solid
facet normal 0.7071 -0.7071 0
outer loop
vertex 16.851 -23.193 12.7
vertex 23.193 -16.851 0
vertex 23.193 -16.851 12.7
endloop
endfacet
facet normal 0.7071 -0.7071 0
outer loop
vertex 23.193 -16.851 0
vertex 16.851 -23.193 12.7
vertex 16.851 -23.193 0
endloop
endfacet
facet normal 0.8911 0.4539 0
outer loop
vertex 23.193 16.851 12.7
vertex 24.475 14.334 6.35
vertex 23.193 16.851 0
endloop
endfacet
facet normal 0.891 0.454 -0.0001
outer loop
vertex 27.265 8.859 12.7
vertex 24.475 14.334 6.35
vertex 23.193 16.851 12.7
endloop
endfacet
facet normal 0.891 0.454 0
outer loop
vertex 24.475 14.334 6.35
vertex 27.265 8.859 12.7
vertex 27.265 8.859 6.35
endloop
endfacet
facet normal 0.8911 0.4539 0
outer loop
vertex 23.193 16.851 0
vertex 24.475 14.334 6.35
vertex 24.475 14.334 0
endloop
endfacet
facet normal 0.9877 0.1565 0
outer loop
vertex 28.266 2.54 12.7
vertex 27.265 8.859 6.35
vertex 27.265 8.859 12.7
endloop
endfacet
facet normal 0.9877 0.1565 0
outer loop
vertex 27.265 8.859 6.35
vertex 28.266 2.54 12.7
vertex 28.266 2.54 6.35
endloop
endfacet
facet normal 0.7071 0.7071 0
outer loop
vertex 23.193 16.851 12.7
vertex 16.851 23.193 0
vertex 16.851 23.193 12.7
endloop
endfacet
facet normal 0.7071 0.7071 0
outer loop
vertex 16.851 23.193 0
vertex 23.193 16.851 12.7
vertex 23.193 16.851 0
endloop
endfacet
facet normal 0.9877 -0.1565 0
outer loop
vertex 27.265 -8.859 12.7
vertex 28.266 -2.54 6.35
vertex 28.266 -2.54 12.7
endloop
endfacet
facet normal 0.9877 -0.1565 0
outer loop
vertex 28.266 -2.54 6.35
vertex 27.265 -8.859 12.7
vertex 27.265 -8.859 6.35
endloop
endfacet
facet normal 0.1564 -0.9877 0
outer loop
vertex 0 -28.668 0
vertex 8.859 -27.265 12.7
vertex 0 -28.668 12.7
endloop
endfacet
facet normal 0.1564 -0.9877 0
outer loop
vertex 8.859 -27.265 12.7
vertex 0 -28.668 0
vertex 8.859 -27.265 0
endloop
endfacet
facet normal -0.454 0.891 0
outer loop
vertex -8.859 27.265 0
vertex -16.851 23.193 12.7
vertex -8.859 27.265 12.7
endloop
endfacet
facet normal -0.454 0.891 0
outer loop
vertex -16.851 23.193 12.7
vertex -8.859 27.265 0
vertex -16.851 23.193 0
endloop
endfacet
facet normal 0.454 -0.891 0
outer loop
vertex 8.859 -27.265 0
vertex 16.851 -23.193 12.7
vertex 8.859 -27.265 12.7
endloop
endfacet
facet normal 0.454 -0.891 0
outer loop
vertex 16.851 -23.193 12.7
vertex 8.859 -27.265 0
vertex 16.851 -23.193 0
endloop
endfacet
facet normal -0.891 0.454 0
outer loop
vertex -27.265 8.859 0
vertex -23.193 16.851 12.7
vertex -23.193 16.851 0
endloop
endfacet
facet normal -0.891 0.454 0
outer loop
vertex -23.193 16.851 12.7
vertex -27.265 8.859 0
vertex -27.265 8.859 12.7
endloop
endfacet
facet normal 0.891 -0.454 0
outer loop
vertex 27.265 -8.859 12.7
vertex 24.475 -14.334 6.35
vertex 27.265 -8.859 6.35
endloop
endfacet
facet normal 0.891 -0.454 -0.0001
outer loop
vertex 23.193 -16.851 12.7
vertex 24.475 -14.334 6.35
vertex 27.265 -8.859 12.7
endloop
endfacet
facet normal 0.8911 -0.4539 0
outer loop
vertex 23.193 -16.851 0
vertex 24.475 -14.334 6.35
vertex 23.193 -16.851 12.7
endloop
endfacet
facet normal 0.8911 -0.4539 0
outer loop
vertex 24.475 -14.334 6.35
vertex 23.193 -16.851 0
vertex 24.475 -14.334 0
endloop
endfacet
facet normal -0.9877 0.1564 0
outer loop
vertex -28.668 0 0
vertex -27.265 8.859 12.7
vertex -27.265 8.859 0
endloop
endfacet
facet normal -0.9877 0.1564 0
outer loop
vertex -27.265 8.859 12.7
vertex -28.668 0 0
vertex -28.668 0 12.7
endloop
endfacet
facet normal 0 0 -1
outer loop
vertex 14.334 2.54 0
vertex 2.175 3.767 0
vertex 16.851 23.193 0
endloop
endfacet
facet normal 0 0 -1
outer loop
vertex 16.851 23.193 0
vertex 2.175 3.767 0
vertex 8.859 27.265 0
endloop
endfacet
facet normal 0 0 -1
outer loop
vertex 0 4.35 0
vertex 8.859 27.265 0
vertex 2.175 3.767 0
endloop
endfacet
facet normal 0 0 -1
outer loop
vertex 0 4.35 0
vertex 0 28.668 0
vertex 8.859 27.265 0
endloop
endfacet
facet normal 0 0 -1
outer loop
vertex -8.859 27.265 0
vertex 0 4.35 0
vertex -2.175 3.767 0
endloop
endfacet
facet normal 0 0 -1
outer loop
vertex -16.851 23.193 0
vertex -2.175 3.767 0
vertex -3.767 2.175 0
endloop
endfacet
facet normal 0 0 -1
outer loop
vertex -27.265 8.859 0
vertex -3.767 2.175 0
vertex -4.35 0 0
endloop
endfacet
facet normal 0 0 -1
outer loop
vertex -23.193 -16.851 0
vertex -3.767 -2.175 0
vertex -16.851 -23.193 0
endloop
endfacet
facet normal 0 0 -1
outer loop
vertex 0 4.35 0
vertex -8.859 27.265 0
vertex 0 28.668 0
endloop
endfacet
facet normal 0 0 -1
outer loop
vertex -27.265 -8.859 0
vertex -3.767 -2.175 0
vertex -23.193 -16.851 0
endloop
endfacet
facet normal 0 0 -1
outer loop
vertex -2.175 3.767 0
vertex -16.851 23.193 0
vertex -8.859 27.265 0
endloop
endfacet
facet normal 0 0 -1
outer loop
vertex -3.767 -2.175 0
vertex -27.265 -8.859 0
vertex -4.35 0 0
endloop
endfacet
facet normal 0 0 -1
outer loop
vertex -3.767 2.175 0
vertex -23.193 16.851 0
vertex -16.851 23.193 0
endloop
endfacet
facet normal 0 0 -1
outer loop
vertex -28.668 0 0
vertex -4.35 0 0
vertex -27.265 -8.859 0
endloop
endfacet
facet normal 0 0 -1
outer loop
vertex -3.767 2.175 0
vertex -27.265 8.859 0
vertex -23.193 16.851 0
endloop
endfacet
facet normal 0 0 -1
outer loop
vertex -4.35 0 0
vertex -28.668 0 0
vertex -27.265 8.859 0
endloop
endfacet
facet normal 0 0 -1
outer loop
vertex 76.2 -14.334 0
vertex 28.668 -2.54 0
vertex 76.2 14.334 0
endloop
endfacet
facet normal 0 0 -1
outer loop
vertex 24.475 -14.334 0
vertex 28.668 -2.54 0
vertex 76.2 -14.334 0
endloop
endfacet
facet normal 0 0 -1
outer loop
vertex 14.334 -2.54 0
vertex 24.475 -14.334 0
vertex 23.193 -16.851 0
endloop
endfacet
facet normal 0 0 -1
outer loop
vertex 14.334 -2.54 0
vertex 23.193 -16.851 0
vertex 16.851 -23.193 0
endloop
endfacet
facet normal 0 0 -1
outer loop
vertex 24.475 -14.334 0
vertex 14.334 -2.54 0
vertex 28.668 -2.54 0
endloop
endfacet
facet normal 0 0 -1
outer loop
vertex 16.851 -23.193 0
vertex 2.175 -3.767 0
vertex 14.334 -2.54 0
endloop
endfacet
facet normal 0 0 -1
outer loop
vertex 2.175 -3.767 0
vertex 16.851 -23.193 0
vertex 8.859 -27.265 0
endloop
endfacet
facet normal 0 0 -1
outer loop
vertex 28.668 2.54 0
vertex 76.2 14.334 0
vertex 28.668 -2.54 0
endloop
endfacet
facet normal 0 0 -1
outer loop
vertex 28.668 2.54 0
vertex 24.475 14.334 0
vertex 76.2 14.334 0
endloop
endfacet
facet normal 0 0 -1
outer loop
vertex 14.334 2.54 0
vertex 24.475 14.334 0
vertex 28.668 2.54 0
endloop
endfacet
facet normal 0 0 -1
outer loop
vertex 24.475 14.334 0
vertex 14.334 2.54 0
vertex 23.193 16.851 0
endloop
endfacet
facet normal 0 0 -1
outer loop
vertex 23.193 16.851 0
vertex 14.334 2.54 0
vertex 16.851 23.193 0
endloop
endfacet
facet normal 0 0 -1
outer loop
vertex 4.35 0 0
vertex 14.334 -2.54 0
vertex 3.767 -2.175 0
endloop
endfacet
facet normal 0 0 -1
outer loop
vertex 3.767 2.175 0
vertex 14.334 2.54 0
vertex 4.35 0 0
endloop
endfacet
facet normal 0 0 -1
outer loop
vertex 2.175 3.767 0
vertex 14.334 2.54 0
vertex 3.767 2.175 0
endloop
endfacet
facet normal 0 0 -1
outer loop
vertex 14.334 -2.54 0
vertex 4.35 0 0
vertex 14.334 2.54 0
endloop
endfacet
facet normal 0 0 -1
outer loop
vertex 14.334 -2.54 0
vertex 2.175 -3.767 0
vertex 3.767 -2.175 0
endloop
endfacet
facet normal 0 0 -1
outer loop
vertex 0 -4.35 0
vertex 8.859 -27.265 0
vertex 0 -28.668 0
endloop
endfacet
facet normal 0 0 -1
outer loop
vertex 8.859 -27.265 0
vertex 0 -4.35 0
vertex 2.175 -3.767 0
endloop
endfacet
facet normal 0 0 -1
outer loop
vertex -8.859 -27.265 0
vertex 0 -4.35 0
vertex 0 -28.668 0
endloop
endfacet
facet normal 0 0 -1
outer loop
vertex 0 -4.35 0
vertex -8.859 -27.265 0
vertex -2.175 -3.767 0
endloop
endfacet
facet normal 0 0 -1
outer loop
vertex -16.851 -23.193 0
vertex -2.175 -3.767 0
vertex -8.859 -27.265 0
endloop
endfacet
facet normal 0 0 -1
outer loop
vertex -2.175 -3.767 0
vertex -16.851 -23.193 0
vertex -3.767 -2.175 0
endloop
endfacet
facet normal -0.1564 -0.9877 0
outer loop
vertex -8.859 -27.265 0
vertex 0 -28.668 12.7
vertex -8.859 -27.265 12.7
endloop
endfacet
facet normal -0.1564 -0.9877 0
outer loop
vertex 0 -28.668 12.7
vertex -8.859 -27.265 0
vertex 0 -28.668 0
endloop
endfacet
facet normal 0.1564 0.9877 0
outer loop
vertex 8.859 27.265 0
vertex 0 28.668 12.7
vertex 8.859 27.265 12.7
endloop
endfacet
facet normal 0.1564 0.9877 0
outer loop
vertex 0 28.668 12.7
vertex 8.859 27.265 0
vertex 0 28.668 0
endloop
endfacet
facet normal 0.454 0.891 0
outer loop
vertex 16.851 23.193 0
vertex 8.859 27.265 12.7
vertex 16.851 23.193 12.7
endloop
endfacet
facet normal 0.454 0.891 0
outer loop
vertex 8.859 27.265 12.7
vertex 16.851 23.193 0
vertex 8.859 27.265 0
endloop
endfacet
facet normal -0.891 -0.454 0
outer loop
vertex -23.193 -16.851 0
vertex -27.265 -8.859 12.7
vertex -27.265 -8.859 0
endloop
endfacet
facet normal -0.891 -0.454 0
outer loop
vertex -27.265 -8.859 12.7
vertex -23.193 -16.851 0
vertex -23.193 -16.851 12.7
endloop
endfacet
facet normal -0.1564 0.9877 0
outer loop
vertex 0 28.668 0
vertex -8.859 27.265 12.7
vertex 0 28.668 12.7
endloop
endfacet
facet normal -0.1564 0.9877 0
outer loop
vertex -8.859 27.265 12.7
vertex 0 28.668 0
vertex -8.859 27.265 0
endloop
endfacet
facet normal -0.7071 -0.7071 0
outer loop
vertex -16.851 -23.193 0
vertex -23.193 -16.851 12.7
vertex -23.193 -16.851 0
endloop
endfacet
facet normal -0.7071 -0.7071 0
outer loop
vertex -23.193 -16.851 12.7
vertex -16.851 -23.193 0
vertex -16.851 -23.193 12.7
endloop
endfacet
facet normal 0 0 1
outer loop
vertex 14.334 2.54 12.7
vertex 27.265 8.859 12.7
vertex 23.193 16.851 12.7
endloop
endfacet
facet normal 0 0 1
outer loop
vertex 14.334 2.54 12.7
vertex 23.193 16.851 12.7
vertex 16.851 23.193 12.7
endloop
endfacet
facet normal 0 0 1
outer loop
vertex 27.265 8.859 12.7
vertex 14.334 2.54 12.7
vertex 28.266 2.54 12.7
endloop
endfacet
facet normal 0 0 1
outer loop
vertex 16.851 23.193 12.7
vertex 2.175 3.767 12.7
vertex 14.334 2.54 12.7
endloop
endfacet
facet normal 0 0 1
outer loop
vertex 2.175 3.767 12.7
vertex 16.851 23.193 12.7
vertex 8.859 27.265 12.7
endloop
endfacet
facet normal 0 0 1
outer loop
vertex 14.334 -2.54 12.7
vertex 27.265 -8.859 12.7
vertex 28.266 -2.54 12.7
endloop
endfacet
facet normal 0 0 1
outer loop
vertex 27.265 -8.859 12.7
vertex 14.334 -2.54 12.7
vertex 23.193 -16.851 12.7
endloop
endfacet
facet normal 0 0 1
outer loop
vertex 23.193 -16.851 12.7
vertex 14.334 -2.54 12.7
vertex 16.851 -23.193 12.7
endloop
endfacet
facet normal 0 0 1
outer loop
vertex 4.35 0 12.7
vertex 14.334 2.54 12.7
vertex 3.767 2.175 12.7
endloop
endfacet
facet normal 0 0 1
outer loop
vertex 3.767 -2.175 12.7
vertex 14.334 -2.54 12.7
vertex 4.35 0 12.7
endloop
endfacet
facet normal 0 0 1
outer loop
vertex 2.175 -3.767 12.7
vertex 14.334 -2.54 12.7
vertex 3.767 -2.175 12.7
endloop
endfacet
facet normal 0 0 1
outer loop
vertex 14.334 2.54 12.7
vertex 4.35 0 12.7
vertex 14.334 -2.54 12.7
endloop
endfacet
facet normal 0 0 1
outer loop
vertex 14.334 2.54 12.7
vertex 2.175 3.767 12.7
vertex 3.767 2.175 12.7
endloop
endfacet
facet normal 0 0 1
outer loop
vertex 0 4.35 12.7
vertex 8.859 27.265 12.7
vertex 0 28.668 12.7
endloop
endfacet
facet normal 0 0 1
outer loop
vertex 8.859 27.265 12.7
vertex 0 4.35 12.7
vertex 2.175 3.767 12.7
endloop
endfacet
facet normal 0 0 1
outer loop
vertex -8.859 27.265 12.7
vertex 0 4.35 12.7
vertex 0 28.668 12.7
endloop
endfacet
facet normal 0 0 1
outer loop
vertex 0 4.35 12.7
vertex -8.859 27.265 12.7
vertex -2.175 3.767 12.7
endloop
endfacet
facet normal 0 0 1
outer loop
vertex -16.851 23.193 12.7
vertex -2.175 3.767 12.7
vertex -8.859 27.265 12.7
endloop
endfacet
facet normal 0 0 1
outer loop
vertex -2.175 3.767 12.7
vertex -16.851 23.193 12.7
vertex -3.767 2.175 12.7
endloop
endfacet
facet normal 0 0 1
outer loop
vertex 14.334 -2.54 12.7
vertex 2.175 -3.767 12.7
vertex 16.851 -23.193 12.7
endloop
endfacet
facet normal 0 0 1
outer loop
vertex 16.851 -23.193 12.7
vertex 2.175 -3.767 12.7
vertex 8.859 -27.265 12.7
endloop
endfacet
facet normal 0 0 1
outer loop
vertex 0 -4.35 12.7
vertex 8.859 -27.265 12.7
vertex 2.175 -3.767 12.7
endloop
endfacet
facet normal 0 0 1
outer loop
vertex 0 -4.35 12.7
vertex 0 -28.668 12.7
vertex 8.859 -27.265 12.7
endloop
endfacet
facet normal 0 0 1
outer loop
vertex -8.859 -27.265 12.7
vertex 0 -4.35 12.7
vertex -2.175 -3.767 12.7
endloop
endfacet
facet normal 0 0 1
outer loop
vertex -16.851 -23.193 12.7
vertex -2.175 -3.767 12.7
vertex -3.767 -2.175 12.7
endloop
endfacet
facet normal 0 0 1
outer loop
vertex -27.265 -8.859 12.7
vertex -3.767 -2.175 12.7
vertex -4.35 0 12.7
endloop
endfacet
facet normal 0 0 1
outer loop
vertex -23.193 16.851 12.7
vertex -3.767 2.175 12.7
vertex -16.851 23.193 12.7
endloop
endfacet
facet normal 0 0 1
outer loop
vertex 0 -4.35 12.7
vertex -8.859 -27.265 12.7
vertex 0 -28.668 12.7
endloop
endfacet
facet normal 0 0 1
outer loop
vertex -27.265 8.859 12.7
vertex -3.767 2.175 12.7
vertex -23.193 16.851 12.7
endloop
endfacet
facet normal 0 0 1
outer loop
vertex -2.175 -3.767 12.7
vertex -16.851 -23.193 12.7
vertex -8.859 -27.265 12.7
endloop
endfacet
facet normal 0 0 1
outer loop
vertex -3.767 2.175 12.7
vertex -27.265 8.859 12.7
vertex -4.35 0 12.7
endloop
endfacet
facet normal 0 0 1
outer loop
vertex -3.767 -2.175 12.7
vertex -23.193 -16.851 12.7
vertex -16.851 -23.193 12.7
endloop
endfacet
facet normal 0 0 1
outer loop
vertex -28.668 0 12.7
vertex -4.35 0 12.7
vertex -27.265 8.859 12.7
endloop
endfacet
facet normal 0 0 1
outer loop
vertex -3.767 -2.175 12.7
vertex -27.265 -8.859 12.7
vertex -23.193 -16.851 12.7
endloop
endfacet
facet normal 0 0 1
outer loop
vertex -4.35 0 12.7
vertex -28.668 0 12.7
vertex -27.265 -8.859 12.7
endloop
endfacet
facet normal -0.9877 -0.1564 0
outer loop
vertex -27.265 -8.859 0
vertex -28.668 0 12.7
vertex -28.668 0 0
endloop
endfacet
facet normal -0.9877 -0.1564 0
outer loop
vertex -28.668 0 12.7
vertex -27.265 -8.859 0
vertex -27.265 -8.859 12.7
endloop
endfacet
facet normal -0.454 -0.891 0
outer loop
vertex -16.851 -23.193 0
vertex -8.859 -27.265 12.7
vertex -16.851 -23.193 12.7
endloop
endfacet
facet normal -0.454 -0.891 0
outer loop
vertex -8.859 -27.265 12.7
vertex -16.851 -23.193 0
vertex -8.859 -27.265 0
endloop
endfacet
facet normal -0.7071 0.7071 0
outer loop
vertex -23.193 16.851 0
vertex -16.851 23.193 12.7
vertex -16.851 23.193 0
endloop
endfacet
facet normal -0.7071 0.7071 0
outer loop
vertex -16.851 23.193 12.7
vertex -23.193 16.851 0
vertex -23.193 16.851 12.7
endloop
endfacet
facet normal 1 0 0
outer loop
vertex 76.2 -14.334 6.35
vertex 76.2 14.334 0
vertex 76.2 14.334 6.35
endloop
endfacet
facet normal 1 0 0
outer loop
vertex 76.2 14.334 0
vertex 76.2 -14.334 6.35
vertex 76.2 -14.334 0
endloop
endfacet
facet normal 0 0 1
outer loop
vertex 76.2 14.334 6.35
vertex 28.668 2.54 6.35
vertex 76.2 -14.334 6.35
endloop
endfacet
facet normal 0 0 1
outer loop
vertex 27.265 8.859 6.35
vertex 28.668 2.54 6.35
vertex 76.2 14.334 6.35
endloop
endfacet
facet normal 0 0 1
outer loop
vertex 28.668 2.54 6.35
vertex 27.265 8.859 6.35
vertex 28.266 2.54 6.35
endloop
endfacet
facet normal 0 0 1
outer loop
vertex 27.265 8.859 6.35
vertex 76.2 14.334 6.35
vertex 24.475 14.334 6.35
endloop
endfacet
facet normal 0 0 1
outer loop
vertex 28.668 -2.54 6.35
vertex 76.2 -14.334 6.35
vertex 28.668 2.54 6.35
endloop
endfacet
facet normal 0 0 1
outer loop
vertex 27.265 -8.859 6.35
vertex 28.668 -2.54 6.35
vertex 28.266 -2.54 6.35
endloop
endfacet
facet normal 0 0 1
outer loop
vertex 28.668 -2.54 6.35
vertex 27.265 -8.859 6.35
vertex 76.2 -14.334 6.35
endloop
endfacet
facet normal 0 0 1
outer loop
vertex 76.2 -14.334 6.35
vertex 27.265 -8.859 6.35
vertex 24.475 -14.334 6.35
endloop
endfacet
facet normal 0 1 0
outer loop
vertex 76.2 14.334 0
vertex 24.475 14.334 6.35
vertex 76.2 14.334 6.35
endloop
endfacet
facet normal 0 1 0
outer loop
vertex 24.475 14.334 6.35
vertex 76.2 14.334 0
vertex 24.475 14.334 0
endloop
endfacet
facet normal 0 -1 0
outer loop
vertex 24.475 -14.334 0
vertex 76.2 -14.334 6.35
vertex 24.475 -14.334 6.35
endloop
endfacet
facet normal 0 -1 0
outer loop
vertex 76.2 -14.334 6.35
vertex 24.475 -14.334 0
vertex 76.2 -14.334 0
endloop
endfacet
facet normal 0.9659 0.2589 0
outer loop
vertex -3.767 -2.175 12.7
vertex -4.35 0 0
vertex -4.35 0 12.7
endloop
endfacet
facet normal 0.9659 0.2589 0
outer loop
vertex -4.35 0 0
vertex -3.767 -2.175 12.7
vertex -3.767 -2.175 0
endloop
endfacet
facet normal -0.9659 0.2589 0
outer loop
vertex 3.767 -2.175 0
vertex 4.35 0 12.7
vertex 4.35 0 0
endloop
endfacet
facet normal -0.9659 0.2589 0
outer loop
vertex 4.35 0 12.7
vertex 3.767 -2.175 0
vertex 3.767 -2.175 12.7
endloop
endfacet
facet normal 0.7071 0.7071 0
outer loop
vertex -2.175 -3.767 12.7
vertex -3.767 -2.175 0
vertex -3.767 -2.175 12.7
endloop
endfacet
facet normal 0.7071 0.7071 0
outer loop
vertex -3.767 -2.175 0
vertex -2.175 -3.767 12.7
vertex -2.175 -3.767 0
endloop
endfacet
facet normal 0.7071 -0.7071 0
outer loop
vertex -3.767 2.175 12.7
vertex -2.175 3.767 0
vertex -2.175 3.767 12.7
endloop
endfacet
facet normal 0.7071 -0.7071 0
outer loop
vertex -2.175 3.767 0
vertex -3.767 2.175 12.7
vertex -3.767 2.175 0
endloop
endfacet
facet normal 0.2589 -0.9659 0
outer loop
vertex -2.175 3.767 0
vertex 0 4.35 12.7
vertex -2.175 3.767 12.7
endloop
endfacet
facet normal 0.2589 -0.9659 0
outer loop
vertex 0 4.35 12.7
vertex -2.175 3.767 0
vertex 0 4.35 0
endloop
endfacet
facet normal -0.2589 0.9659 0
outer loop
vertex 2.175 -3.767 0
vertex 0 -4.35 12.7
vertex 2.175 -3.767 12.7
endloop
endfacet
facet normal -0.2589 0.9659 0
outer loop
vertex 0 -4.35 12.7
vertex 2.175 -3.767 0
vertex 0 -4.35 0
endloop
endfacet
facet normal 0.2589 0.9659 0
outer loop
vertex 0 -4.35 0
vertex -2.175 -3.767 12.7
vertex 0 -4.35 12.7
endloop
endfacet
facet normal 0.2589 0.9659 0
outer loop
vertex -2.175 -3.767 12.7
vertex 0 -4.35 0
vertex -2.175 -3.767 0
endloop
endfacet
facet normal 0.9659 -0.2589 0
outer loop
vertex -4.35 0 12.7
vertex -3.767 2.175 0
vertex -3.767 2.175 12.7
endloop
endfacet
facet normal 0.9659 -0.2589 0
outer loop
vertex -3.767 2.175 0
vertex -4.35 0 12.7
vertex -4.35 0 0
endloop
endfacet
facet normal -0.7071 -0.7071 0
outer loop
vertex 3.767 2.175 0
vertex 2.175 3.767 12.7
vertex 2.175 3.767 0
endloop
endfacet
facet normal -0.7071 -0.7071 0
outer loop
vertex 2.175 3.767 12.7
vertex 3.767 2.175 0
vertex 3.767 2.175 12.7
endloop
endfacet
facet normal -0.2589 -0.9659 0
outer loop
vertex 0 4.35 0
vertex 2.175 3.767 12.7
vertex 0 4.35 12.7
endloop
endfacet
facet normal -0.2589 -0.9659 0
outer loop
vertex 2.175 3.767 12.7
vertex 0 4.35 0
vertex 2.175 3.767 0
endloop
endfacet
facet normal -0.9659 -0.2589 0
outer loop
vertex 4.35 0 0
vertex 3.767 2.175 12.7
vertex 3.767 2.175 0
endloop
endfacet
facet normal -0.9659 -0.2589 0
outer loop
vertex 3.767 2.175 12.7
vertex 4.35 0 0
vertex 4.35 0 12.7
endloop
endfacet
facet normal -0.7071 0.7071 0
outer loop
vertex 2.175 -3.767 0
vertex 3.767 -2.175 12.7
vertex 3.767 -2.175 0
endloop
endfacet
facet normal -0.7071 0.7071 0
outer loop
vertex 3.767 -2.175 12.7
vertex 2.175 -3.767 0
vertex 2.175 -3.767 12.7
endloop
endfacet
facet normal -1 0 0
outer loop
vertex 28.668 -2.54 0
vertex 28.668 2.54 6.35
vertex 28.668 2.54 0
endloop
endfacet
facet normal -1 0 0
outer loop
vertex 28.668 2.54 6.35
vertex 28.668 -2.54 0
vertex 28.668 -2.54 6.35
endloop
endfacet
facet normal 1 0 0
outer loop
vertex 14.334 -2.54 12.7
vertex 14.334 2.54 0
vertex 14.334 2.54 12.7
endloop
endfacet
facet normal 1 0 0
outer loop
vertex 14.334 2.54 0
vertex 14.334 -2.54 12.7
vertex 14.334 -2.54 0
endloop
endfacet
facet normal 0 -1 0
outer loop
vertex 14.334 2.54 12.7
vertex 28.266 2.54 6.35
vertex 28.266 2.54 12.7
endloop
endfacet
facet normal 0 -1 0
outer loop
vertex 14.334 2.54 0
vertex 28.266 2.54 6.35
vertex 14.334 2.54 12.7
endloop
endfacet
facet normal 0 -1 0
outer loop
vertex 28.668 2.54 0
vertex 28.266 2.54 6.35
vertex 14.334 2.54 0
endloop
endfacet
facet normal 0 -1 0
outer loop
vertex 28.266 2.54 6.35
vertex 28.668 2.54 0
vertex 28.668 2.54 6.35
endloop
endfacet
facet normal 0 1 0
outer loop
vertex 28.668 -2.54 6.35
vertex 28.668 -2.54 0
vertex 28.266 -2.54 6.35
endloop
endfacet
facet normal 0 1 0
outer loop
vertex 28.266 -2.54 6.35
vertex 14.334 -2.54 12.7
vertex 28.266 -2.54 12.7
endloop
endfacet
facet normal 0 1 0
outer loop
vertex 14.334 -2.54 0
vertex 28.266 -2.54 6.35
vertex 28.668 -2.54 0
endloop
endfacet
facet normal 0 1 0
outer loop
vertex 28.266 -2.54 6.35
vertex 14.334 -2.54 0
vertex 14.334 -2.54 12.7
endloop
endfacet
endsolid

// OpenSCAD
// file: ../Vitamins/Rod.scad
RodDiameter       = 1;
RodRadius         = 2;
RodClearanceSnug  = 3;
RodClearanceLoose = 4;
RodFn             = 5;

function RodClearanceSnug()  = RodClearanceSnug;
function RodClearanceLoose() = RodClearanceLoose;

RodBicNozzle = [
  [RodDiameter, 0.093],
  [RodRadius, 0.093/2],
  [RodClearanceSnug, 0.04],
  [RodClearanceLoose, 0.06],
  [RodFn, 5]
];
function Spec_RodBicNozzle() = RodBicNozzle;

RodBicFlint = [
  [RodDiameter, 0.0985],
  [RodRadius, 0.0985/2],
  [RodClearanceSnug, 0.04],
  [RodClearanceLoose, 0.06],
  [RodFn, 5]
];
function Spec_RodBicFlint() = RodBicFlint;

RodOneEighthInch = [
  [RodDiameter, 1/8],
  [RodRadius, 1/8/2],
  [RodClearanceSnug, 0.02],
  [RodClearanceLoose, 0.03],
  [RodFn, 8]
];
function Spec_RodOneEighthInch() = RodOneEighthInch;

RodOneQuarterInch = [
  [RodDiameter,       1/4],
  [RodRadius,         1/4/2],
  [RodClearanceSnug,  0.027],
  [RodClearanceLoose, 0.035],
  [RodFn,             8]
];
function Spec_RodOneQuarterInch() = RodOneQuarterInch;

RodFiveSixteenthInch = [
  [RodDiameter,       5/16],
  [RodRadius,         5/16/2],
  [RodClearanceSnug,  0.025],
  [RodClearanceLoose, 0.03],
  [RodFn,             12]
];
function Spec_RodFiveSixteenthInch() = RodFiveSixteenthInch;

RodThreeQuarterInchTubing = [
  [RodDiameter,       0.758],
  [RodRadius,         0.758/2],
  [RodClearanceSnug,  0.023],
  [RodClearanceLoose, 0.029],
  [RodFn,             30]
];
function Spec_RodThreeQuarterInchTubing() = RodThreeQuarterInchTubing;

/**
 * Lookup the diameter of a rod.
 * @param rod The rod to lookup.
 * @param clearance The RodClearance to use.
 */
function RodDiameter(rod=undef, clearance=undef)
           = lookup(RodDiameter, rod)
          + (clearance != undef ? lookup(clearance, rod) : 0);

/**
 * Lookup the radius of a rod.
 * @param rod The rod to lookup.
 * @param clearance The RodClearance to use.
 */
function RodRadius(rod, clearance=undef) = RodDiameter(rod, clearance)/2;

/**
 * Lookup the $fn value for a rod, optionally overriding it
 * @param rod The rod to lookup.
 * @param $fn Override the RodFn. If defined, this will be the result. (convenience arg)
 **/
function RodFn(rod, $fn=undef) = ($fn == undef) ? lookup(RodFn, rod) : $fn;

/**
 * A 2D rod (circle).
 * @param rod The rod to render.
 * @param clearance The RodClearance to use.
 * @param $fn Override the RodFn value of the rod.
 */
module Rod2d(rod=RodOneQuarterInch, clearance=undef, $fn=undef) {
  circle(r=RodRadius(rod, clearance),
         $fn=RodFn(rod, $fn));
}


module Rod(rod=RodOneQuarterInch, length=1, clearance=undef, center=false, $fn=undef) {
  render(convexity=1)
  linear_extrude(height=length, center=center)
  Rod2d(rod, clearance, $fn=$fn);
}

// 1/8" Rod
1_8_rod_d                = 1/8;
1_8_rod_r                = 1_8_rod_d/2;
1_8_rod_clearance        = 0.02;
1_8_rod_clearance_loose  = 0.03;

// 1/4" Rod
1_4_rod_d                = 1/4;
1_4_rod_r                = 1_4_rod_d/2;
1_4_rod_clearance        = 0.01;
1_4_rod_clearance_loose  = 0.015;
1_4_rod_collar_d         = 1/22;
1_4_rod_collar_width     = 0.27;
1_4_rod_collar_clearance = 0.0; // TODO

// 5/16" Rod
5_16_rod_d                = 5/16;
5_16_rod_r                = 5_16_rod_d/2;
5_16_rod_clearance        = 0.02; // TODO
5_16_rod_clearance_loose  = 0.02;

module rod(diameter=1, length=1, clearance=0, clearance_loose=0, loose=false, cutter=false, center=false, $fn=20) {
  clearance = loose ? clearance_loose : clearance;

  if (cutter) {
    cylinder(r=(diameter/2) + (loose ? clearance_loose : clearance), h=length, center=center);
  } else {
    cylinder(r=diameter/2, h=length, center=center);
  }
}

module 1_8_rod(length=1, loose=false, cutter=false, center=false) {
  rod(diameter=1_8_rod_d,
      clearance=1_8_rod_clearance,
      clearance_loose=1_8_rod_clearance_loose,
      length=length,
      cutter=cutter,
      center=center);
}

module 1_4_rod(length=1, loose=false, cutter=false, center=false) {
  rod(diameter=1_4_rod_d,
      clearance=1_4_rod_clearance,
      clearance_loose=1_4_rod_clearance_loose,
      loose=loose,
      length=length,
      cutter=cutter,
      center=center);
}

module 1_4_rod_collar(cutter=false) {
  rod(diameter=1_4_rod_collar_d,
      clearance=1_4_rod_collar_clearance,
      cutter=cutter,
      length=1_4_rod_collar_width);
}

module 5_16_rod(length=1, loose=false, cutter=false, center=false) {
  rod(diameter=5_16_rod_d,
      clearance=5_16_rod_clearance,
      clearance_loose=5_16_rod_clearance_loose,
      length=length,
      cutter=cutter,
      center=center);
}
// main file
use <../Vitamins/Rod.scad>

module RoundCocker(cockerRod = Spec_RodFiveSixteenthInch(),
                   travel=1,
                   length=3,
                   width=0.25) {
                     
  diameter = sqrt(travel*4/3.14)*2;

  difference() {
    union() {
      
      // Main body
      cylinder(r1=diameter/2, r2=diameter/2, h=width*2, $fn=20);
      
      // Crank arm
      translate([0,-diameter/4])
      cube([length, diameter/2, width]);
    }
    
    // Spindle
    Rod(rod=cockerRod, clearance=RodClearanceLoose(), length=2, center=true);
    
    // Rope holes
    *for (i=[0:3])
    rotate(i*90)
    translate([diameter/3,0])
    #cylinder(r=0.1, h=2, center=true);
    
    // Rope slot
    #translate([diameter/4,-0.1,-0.1])
    cube([diameter/4, 0.2, 1]);
  }
}

scale([25.4, 25.4, 25.4])
RoundCocker();
